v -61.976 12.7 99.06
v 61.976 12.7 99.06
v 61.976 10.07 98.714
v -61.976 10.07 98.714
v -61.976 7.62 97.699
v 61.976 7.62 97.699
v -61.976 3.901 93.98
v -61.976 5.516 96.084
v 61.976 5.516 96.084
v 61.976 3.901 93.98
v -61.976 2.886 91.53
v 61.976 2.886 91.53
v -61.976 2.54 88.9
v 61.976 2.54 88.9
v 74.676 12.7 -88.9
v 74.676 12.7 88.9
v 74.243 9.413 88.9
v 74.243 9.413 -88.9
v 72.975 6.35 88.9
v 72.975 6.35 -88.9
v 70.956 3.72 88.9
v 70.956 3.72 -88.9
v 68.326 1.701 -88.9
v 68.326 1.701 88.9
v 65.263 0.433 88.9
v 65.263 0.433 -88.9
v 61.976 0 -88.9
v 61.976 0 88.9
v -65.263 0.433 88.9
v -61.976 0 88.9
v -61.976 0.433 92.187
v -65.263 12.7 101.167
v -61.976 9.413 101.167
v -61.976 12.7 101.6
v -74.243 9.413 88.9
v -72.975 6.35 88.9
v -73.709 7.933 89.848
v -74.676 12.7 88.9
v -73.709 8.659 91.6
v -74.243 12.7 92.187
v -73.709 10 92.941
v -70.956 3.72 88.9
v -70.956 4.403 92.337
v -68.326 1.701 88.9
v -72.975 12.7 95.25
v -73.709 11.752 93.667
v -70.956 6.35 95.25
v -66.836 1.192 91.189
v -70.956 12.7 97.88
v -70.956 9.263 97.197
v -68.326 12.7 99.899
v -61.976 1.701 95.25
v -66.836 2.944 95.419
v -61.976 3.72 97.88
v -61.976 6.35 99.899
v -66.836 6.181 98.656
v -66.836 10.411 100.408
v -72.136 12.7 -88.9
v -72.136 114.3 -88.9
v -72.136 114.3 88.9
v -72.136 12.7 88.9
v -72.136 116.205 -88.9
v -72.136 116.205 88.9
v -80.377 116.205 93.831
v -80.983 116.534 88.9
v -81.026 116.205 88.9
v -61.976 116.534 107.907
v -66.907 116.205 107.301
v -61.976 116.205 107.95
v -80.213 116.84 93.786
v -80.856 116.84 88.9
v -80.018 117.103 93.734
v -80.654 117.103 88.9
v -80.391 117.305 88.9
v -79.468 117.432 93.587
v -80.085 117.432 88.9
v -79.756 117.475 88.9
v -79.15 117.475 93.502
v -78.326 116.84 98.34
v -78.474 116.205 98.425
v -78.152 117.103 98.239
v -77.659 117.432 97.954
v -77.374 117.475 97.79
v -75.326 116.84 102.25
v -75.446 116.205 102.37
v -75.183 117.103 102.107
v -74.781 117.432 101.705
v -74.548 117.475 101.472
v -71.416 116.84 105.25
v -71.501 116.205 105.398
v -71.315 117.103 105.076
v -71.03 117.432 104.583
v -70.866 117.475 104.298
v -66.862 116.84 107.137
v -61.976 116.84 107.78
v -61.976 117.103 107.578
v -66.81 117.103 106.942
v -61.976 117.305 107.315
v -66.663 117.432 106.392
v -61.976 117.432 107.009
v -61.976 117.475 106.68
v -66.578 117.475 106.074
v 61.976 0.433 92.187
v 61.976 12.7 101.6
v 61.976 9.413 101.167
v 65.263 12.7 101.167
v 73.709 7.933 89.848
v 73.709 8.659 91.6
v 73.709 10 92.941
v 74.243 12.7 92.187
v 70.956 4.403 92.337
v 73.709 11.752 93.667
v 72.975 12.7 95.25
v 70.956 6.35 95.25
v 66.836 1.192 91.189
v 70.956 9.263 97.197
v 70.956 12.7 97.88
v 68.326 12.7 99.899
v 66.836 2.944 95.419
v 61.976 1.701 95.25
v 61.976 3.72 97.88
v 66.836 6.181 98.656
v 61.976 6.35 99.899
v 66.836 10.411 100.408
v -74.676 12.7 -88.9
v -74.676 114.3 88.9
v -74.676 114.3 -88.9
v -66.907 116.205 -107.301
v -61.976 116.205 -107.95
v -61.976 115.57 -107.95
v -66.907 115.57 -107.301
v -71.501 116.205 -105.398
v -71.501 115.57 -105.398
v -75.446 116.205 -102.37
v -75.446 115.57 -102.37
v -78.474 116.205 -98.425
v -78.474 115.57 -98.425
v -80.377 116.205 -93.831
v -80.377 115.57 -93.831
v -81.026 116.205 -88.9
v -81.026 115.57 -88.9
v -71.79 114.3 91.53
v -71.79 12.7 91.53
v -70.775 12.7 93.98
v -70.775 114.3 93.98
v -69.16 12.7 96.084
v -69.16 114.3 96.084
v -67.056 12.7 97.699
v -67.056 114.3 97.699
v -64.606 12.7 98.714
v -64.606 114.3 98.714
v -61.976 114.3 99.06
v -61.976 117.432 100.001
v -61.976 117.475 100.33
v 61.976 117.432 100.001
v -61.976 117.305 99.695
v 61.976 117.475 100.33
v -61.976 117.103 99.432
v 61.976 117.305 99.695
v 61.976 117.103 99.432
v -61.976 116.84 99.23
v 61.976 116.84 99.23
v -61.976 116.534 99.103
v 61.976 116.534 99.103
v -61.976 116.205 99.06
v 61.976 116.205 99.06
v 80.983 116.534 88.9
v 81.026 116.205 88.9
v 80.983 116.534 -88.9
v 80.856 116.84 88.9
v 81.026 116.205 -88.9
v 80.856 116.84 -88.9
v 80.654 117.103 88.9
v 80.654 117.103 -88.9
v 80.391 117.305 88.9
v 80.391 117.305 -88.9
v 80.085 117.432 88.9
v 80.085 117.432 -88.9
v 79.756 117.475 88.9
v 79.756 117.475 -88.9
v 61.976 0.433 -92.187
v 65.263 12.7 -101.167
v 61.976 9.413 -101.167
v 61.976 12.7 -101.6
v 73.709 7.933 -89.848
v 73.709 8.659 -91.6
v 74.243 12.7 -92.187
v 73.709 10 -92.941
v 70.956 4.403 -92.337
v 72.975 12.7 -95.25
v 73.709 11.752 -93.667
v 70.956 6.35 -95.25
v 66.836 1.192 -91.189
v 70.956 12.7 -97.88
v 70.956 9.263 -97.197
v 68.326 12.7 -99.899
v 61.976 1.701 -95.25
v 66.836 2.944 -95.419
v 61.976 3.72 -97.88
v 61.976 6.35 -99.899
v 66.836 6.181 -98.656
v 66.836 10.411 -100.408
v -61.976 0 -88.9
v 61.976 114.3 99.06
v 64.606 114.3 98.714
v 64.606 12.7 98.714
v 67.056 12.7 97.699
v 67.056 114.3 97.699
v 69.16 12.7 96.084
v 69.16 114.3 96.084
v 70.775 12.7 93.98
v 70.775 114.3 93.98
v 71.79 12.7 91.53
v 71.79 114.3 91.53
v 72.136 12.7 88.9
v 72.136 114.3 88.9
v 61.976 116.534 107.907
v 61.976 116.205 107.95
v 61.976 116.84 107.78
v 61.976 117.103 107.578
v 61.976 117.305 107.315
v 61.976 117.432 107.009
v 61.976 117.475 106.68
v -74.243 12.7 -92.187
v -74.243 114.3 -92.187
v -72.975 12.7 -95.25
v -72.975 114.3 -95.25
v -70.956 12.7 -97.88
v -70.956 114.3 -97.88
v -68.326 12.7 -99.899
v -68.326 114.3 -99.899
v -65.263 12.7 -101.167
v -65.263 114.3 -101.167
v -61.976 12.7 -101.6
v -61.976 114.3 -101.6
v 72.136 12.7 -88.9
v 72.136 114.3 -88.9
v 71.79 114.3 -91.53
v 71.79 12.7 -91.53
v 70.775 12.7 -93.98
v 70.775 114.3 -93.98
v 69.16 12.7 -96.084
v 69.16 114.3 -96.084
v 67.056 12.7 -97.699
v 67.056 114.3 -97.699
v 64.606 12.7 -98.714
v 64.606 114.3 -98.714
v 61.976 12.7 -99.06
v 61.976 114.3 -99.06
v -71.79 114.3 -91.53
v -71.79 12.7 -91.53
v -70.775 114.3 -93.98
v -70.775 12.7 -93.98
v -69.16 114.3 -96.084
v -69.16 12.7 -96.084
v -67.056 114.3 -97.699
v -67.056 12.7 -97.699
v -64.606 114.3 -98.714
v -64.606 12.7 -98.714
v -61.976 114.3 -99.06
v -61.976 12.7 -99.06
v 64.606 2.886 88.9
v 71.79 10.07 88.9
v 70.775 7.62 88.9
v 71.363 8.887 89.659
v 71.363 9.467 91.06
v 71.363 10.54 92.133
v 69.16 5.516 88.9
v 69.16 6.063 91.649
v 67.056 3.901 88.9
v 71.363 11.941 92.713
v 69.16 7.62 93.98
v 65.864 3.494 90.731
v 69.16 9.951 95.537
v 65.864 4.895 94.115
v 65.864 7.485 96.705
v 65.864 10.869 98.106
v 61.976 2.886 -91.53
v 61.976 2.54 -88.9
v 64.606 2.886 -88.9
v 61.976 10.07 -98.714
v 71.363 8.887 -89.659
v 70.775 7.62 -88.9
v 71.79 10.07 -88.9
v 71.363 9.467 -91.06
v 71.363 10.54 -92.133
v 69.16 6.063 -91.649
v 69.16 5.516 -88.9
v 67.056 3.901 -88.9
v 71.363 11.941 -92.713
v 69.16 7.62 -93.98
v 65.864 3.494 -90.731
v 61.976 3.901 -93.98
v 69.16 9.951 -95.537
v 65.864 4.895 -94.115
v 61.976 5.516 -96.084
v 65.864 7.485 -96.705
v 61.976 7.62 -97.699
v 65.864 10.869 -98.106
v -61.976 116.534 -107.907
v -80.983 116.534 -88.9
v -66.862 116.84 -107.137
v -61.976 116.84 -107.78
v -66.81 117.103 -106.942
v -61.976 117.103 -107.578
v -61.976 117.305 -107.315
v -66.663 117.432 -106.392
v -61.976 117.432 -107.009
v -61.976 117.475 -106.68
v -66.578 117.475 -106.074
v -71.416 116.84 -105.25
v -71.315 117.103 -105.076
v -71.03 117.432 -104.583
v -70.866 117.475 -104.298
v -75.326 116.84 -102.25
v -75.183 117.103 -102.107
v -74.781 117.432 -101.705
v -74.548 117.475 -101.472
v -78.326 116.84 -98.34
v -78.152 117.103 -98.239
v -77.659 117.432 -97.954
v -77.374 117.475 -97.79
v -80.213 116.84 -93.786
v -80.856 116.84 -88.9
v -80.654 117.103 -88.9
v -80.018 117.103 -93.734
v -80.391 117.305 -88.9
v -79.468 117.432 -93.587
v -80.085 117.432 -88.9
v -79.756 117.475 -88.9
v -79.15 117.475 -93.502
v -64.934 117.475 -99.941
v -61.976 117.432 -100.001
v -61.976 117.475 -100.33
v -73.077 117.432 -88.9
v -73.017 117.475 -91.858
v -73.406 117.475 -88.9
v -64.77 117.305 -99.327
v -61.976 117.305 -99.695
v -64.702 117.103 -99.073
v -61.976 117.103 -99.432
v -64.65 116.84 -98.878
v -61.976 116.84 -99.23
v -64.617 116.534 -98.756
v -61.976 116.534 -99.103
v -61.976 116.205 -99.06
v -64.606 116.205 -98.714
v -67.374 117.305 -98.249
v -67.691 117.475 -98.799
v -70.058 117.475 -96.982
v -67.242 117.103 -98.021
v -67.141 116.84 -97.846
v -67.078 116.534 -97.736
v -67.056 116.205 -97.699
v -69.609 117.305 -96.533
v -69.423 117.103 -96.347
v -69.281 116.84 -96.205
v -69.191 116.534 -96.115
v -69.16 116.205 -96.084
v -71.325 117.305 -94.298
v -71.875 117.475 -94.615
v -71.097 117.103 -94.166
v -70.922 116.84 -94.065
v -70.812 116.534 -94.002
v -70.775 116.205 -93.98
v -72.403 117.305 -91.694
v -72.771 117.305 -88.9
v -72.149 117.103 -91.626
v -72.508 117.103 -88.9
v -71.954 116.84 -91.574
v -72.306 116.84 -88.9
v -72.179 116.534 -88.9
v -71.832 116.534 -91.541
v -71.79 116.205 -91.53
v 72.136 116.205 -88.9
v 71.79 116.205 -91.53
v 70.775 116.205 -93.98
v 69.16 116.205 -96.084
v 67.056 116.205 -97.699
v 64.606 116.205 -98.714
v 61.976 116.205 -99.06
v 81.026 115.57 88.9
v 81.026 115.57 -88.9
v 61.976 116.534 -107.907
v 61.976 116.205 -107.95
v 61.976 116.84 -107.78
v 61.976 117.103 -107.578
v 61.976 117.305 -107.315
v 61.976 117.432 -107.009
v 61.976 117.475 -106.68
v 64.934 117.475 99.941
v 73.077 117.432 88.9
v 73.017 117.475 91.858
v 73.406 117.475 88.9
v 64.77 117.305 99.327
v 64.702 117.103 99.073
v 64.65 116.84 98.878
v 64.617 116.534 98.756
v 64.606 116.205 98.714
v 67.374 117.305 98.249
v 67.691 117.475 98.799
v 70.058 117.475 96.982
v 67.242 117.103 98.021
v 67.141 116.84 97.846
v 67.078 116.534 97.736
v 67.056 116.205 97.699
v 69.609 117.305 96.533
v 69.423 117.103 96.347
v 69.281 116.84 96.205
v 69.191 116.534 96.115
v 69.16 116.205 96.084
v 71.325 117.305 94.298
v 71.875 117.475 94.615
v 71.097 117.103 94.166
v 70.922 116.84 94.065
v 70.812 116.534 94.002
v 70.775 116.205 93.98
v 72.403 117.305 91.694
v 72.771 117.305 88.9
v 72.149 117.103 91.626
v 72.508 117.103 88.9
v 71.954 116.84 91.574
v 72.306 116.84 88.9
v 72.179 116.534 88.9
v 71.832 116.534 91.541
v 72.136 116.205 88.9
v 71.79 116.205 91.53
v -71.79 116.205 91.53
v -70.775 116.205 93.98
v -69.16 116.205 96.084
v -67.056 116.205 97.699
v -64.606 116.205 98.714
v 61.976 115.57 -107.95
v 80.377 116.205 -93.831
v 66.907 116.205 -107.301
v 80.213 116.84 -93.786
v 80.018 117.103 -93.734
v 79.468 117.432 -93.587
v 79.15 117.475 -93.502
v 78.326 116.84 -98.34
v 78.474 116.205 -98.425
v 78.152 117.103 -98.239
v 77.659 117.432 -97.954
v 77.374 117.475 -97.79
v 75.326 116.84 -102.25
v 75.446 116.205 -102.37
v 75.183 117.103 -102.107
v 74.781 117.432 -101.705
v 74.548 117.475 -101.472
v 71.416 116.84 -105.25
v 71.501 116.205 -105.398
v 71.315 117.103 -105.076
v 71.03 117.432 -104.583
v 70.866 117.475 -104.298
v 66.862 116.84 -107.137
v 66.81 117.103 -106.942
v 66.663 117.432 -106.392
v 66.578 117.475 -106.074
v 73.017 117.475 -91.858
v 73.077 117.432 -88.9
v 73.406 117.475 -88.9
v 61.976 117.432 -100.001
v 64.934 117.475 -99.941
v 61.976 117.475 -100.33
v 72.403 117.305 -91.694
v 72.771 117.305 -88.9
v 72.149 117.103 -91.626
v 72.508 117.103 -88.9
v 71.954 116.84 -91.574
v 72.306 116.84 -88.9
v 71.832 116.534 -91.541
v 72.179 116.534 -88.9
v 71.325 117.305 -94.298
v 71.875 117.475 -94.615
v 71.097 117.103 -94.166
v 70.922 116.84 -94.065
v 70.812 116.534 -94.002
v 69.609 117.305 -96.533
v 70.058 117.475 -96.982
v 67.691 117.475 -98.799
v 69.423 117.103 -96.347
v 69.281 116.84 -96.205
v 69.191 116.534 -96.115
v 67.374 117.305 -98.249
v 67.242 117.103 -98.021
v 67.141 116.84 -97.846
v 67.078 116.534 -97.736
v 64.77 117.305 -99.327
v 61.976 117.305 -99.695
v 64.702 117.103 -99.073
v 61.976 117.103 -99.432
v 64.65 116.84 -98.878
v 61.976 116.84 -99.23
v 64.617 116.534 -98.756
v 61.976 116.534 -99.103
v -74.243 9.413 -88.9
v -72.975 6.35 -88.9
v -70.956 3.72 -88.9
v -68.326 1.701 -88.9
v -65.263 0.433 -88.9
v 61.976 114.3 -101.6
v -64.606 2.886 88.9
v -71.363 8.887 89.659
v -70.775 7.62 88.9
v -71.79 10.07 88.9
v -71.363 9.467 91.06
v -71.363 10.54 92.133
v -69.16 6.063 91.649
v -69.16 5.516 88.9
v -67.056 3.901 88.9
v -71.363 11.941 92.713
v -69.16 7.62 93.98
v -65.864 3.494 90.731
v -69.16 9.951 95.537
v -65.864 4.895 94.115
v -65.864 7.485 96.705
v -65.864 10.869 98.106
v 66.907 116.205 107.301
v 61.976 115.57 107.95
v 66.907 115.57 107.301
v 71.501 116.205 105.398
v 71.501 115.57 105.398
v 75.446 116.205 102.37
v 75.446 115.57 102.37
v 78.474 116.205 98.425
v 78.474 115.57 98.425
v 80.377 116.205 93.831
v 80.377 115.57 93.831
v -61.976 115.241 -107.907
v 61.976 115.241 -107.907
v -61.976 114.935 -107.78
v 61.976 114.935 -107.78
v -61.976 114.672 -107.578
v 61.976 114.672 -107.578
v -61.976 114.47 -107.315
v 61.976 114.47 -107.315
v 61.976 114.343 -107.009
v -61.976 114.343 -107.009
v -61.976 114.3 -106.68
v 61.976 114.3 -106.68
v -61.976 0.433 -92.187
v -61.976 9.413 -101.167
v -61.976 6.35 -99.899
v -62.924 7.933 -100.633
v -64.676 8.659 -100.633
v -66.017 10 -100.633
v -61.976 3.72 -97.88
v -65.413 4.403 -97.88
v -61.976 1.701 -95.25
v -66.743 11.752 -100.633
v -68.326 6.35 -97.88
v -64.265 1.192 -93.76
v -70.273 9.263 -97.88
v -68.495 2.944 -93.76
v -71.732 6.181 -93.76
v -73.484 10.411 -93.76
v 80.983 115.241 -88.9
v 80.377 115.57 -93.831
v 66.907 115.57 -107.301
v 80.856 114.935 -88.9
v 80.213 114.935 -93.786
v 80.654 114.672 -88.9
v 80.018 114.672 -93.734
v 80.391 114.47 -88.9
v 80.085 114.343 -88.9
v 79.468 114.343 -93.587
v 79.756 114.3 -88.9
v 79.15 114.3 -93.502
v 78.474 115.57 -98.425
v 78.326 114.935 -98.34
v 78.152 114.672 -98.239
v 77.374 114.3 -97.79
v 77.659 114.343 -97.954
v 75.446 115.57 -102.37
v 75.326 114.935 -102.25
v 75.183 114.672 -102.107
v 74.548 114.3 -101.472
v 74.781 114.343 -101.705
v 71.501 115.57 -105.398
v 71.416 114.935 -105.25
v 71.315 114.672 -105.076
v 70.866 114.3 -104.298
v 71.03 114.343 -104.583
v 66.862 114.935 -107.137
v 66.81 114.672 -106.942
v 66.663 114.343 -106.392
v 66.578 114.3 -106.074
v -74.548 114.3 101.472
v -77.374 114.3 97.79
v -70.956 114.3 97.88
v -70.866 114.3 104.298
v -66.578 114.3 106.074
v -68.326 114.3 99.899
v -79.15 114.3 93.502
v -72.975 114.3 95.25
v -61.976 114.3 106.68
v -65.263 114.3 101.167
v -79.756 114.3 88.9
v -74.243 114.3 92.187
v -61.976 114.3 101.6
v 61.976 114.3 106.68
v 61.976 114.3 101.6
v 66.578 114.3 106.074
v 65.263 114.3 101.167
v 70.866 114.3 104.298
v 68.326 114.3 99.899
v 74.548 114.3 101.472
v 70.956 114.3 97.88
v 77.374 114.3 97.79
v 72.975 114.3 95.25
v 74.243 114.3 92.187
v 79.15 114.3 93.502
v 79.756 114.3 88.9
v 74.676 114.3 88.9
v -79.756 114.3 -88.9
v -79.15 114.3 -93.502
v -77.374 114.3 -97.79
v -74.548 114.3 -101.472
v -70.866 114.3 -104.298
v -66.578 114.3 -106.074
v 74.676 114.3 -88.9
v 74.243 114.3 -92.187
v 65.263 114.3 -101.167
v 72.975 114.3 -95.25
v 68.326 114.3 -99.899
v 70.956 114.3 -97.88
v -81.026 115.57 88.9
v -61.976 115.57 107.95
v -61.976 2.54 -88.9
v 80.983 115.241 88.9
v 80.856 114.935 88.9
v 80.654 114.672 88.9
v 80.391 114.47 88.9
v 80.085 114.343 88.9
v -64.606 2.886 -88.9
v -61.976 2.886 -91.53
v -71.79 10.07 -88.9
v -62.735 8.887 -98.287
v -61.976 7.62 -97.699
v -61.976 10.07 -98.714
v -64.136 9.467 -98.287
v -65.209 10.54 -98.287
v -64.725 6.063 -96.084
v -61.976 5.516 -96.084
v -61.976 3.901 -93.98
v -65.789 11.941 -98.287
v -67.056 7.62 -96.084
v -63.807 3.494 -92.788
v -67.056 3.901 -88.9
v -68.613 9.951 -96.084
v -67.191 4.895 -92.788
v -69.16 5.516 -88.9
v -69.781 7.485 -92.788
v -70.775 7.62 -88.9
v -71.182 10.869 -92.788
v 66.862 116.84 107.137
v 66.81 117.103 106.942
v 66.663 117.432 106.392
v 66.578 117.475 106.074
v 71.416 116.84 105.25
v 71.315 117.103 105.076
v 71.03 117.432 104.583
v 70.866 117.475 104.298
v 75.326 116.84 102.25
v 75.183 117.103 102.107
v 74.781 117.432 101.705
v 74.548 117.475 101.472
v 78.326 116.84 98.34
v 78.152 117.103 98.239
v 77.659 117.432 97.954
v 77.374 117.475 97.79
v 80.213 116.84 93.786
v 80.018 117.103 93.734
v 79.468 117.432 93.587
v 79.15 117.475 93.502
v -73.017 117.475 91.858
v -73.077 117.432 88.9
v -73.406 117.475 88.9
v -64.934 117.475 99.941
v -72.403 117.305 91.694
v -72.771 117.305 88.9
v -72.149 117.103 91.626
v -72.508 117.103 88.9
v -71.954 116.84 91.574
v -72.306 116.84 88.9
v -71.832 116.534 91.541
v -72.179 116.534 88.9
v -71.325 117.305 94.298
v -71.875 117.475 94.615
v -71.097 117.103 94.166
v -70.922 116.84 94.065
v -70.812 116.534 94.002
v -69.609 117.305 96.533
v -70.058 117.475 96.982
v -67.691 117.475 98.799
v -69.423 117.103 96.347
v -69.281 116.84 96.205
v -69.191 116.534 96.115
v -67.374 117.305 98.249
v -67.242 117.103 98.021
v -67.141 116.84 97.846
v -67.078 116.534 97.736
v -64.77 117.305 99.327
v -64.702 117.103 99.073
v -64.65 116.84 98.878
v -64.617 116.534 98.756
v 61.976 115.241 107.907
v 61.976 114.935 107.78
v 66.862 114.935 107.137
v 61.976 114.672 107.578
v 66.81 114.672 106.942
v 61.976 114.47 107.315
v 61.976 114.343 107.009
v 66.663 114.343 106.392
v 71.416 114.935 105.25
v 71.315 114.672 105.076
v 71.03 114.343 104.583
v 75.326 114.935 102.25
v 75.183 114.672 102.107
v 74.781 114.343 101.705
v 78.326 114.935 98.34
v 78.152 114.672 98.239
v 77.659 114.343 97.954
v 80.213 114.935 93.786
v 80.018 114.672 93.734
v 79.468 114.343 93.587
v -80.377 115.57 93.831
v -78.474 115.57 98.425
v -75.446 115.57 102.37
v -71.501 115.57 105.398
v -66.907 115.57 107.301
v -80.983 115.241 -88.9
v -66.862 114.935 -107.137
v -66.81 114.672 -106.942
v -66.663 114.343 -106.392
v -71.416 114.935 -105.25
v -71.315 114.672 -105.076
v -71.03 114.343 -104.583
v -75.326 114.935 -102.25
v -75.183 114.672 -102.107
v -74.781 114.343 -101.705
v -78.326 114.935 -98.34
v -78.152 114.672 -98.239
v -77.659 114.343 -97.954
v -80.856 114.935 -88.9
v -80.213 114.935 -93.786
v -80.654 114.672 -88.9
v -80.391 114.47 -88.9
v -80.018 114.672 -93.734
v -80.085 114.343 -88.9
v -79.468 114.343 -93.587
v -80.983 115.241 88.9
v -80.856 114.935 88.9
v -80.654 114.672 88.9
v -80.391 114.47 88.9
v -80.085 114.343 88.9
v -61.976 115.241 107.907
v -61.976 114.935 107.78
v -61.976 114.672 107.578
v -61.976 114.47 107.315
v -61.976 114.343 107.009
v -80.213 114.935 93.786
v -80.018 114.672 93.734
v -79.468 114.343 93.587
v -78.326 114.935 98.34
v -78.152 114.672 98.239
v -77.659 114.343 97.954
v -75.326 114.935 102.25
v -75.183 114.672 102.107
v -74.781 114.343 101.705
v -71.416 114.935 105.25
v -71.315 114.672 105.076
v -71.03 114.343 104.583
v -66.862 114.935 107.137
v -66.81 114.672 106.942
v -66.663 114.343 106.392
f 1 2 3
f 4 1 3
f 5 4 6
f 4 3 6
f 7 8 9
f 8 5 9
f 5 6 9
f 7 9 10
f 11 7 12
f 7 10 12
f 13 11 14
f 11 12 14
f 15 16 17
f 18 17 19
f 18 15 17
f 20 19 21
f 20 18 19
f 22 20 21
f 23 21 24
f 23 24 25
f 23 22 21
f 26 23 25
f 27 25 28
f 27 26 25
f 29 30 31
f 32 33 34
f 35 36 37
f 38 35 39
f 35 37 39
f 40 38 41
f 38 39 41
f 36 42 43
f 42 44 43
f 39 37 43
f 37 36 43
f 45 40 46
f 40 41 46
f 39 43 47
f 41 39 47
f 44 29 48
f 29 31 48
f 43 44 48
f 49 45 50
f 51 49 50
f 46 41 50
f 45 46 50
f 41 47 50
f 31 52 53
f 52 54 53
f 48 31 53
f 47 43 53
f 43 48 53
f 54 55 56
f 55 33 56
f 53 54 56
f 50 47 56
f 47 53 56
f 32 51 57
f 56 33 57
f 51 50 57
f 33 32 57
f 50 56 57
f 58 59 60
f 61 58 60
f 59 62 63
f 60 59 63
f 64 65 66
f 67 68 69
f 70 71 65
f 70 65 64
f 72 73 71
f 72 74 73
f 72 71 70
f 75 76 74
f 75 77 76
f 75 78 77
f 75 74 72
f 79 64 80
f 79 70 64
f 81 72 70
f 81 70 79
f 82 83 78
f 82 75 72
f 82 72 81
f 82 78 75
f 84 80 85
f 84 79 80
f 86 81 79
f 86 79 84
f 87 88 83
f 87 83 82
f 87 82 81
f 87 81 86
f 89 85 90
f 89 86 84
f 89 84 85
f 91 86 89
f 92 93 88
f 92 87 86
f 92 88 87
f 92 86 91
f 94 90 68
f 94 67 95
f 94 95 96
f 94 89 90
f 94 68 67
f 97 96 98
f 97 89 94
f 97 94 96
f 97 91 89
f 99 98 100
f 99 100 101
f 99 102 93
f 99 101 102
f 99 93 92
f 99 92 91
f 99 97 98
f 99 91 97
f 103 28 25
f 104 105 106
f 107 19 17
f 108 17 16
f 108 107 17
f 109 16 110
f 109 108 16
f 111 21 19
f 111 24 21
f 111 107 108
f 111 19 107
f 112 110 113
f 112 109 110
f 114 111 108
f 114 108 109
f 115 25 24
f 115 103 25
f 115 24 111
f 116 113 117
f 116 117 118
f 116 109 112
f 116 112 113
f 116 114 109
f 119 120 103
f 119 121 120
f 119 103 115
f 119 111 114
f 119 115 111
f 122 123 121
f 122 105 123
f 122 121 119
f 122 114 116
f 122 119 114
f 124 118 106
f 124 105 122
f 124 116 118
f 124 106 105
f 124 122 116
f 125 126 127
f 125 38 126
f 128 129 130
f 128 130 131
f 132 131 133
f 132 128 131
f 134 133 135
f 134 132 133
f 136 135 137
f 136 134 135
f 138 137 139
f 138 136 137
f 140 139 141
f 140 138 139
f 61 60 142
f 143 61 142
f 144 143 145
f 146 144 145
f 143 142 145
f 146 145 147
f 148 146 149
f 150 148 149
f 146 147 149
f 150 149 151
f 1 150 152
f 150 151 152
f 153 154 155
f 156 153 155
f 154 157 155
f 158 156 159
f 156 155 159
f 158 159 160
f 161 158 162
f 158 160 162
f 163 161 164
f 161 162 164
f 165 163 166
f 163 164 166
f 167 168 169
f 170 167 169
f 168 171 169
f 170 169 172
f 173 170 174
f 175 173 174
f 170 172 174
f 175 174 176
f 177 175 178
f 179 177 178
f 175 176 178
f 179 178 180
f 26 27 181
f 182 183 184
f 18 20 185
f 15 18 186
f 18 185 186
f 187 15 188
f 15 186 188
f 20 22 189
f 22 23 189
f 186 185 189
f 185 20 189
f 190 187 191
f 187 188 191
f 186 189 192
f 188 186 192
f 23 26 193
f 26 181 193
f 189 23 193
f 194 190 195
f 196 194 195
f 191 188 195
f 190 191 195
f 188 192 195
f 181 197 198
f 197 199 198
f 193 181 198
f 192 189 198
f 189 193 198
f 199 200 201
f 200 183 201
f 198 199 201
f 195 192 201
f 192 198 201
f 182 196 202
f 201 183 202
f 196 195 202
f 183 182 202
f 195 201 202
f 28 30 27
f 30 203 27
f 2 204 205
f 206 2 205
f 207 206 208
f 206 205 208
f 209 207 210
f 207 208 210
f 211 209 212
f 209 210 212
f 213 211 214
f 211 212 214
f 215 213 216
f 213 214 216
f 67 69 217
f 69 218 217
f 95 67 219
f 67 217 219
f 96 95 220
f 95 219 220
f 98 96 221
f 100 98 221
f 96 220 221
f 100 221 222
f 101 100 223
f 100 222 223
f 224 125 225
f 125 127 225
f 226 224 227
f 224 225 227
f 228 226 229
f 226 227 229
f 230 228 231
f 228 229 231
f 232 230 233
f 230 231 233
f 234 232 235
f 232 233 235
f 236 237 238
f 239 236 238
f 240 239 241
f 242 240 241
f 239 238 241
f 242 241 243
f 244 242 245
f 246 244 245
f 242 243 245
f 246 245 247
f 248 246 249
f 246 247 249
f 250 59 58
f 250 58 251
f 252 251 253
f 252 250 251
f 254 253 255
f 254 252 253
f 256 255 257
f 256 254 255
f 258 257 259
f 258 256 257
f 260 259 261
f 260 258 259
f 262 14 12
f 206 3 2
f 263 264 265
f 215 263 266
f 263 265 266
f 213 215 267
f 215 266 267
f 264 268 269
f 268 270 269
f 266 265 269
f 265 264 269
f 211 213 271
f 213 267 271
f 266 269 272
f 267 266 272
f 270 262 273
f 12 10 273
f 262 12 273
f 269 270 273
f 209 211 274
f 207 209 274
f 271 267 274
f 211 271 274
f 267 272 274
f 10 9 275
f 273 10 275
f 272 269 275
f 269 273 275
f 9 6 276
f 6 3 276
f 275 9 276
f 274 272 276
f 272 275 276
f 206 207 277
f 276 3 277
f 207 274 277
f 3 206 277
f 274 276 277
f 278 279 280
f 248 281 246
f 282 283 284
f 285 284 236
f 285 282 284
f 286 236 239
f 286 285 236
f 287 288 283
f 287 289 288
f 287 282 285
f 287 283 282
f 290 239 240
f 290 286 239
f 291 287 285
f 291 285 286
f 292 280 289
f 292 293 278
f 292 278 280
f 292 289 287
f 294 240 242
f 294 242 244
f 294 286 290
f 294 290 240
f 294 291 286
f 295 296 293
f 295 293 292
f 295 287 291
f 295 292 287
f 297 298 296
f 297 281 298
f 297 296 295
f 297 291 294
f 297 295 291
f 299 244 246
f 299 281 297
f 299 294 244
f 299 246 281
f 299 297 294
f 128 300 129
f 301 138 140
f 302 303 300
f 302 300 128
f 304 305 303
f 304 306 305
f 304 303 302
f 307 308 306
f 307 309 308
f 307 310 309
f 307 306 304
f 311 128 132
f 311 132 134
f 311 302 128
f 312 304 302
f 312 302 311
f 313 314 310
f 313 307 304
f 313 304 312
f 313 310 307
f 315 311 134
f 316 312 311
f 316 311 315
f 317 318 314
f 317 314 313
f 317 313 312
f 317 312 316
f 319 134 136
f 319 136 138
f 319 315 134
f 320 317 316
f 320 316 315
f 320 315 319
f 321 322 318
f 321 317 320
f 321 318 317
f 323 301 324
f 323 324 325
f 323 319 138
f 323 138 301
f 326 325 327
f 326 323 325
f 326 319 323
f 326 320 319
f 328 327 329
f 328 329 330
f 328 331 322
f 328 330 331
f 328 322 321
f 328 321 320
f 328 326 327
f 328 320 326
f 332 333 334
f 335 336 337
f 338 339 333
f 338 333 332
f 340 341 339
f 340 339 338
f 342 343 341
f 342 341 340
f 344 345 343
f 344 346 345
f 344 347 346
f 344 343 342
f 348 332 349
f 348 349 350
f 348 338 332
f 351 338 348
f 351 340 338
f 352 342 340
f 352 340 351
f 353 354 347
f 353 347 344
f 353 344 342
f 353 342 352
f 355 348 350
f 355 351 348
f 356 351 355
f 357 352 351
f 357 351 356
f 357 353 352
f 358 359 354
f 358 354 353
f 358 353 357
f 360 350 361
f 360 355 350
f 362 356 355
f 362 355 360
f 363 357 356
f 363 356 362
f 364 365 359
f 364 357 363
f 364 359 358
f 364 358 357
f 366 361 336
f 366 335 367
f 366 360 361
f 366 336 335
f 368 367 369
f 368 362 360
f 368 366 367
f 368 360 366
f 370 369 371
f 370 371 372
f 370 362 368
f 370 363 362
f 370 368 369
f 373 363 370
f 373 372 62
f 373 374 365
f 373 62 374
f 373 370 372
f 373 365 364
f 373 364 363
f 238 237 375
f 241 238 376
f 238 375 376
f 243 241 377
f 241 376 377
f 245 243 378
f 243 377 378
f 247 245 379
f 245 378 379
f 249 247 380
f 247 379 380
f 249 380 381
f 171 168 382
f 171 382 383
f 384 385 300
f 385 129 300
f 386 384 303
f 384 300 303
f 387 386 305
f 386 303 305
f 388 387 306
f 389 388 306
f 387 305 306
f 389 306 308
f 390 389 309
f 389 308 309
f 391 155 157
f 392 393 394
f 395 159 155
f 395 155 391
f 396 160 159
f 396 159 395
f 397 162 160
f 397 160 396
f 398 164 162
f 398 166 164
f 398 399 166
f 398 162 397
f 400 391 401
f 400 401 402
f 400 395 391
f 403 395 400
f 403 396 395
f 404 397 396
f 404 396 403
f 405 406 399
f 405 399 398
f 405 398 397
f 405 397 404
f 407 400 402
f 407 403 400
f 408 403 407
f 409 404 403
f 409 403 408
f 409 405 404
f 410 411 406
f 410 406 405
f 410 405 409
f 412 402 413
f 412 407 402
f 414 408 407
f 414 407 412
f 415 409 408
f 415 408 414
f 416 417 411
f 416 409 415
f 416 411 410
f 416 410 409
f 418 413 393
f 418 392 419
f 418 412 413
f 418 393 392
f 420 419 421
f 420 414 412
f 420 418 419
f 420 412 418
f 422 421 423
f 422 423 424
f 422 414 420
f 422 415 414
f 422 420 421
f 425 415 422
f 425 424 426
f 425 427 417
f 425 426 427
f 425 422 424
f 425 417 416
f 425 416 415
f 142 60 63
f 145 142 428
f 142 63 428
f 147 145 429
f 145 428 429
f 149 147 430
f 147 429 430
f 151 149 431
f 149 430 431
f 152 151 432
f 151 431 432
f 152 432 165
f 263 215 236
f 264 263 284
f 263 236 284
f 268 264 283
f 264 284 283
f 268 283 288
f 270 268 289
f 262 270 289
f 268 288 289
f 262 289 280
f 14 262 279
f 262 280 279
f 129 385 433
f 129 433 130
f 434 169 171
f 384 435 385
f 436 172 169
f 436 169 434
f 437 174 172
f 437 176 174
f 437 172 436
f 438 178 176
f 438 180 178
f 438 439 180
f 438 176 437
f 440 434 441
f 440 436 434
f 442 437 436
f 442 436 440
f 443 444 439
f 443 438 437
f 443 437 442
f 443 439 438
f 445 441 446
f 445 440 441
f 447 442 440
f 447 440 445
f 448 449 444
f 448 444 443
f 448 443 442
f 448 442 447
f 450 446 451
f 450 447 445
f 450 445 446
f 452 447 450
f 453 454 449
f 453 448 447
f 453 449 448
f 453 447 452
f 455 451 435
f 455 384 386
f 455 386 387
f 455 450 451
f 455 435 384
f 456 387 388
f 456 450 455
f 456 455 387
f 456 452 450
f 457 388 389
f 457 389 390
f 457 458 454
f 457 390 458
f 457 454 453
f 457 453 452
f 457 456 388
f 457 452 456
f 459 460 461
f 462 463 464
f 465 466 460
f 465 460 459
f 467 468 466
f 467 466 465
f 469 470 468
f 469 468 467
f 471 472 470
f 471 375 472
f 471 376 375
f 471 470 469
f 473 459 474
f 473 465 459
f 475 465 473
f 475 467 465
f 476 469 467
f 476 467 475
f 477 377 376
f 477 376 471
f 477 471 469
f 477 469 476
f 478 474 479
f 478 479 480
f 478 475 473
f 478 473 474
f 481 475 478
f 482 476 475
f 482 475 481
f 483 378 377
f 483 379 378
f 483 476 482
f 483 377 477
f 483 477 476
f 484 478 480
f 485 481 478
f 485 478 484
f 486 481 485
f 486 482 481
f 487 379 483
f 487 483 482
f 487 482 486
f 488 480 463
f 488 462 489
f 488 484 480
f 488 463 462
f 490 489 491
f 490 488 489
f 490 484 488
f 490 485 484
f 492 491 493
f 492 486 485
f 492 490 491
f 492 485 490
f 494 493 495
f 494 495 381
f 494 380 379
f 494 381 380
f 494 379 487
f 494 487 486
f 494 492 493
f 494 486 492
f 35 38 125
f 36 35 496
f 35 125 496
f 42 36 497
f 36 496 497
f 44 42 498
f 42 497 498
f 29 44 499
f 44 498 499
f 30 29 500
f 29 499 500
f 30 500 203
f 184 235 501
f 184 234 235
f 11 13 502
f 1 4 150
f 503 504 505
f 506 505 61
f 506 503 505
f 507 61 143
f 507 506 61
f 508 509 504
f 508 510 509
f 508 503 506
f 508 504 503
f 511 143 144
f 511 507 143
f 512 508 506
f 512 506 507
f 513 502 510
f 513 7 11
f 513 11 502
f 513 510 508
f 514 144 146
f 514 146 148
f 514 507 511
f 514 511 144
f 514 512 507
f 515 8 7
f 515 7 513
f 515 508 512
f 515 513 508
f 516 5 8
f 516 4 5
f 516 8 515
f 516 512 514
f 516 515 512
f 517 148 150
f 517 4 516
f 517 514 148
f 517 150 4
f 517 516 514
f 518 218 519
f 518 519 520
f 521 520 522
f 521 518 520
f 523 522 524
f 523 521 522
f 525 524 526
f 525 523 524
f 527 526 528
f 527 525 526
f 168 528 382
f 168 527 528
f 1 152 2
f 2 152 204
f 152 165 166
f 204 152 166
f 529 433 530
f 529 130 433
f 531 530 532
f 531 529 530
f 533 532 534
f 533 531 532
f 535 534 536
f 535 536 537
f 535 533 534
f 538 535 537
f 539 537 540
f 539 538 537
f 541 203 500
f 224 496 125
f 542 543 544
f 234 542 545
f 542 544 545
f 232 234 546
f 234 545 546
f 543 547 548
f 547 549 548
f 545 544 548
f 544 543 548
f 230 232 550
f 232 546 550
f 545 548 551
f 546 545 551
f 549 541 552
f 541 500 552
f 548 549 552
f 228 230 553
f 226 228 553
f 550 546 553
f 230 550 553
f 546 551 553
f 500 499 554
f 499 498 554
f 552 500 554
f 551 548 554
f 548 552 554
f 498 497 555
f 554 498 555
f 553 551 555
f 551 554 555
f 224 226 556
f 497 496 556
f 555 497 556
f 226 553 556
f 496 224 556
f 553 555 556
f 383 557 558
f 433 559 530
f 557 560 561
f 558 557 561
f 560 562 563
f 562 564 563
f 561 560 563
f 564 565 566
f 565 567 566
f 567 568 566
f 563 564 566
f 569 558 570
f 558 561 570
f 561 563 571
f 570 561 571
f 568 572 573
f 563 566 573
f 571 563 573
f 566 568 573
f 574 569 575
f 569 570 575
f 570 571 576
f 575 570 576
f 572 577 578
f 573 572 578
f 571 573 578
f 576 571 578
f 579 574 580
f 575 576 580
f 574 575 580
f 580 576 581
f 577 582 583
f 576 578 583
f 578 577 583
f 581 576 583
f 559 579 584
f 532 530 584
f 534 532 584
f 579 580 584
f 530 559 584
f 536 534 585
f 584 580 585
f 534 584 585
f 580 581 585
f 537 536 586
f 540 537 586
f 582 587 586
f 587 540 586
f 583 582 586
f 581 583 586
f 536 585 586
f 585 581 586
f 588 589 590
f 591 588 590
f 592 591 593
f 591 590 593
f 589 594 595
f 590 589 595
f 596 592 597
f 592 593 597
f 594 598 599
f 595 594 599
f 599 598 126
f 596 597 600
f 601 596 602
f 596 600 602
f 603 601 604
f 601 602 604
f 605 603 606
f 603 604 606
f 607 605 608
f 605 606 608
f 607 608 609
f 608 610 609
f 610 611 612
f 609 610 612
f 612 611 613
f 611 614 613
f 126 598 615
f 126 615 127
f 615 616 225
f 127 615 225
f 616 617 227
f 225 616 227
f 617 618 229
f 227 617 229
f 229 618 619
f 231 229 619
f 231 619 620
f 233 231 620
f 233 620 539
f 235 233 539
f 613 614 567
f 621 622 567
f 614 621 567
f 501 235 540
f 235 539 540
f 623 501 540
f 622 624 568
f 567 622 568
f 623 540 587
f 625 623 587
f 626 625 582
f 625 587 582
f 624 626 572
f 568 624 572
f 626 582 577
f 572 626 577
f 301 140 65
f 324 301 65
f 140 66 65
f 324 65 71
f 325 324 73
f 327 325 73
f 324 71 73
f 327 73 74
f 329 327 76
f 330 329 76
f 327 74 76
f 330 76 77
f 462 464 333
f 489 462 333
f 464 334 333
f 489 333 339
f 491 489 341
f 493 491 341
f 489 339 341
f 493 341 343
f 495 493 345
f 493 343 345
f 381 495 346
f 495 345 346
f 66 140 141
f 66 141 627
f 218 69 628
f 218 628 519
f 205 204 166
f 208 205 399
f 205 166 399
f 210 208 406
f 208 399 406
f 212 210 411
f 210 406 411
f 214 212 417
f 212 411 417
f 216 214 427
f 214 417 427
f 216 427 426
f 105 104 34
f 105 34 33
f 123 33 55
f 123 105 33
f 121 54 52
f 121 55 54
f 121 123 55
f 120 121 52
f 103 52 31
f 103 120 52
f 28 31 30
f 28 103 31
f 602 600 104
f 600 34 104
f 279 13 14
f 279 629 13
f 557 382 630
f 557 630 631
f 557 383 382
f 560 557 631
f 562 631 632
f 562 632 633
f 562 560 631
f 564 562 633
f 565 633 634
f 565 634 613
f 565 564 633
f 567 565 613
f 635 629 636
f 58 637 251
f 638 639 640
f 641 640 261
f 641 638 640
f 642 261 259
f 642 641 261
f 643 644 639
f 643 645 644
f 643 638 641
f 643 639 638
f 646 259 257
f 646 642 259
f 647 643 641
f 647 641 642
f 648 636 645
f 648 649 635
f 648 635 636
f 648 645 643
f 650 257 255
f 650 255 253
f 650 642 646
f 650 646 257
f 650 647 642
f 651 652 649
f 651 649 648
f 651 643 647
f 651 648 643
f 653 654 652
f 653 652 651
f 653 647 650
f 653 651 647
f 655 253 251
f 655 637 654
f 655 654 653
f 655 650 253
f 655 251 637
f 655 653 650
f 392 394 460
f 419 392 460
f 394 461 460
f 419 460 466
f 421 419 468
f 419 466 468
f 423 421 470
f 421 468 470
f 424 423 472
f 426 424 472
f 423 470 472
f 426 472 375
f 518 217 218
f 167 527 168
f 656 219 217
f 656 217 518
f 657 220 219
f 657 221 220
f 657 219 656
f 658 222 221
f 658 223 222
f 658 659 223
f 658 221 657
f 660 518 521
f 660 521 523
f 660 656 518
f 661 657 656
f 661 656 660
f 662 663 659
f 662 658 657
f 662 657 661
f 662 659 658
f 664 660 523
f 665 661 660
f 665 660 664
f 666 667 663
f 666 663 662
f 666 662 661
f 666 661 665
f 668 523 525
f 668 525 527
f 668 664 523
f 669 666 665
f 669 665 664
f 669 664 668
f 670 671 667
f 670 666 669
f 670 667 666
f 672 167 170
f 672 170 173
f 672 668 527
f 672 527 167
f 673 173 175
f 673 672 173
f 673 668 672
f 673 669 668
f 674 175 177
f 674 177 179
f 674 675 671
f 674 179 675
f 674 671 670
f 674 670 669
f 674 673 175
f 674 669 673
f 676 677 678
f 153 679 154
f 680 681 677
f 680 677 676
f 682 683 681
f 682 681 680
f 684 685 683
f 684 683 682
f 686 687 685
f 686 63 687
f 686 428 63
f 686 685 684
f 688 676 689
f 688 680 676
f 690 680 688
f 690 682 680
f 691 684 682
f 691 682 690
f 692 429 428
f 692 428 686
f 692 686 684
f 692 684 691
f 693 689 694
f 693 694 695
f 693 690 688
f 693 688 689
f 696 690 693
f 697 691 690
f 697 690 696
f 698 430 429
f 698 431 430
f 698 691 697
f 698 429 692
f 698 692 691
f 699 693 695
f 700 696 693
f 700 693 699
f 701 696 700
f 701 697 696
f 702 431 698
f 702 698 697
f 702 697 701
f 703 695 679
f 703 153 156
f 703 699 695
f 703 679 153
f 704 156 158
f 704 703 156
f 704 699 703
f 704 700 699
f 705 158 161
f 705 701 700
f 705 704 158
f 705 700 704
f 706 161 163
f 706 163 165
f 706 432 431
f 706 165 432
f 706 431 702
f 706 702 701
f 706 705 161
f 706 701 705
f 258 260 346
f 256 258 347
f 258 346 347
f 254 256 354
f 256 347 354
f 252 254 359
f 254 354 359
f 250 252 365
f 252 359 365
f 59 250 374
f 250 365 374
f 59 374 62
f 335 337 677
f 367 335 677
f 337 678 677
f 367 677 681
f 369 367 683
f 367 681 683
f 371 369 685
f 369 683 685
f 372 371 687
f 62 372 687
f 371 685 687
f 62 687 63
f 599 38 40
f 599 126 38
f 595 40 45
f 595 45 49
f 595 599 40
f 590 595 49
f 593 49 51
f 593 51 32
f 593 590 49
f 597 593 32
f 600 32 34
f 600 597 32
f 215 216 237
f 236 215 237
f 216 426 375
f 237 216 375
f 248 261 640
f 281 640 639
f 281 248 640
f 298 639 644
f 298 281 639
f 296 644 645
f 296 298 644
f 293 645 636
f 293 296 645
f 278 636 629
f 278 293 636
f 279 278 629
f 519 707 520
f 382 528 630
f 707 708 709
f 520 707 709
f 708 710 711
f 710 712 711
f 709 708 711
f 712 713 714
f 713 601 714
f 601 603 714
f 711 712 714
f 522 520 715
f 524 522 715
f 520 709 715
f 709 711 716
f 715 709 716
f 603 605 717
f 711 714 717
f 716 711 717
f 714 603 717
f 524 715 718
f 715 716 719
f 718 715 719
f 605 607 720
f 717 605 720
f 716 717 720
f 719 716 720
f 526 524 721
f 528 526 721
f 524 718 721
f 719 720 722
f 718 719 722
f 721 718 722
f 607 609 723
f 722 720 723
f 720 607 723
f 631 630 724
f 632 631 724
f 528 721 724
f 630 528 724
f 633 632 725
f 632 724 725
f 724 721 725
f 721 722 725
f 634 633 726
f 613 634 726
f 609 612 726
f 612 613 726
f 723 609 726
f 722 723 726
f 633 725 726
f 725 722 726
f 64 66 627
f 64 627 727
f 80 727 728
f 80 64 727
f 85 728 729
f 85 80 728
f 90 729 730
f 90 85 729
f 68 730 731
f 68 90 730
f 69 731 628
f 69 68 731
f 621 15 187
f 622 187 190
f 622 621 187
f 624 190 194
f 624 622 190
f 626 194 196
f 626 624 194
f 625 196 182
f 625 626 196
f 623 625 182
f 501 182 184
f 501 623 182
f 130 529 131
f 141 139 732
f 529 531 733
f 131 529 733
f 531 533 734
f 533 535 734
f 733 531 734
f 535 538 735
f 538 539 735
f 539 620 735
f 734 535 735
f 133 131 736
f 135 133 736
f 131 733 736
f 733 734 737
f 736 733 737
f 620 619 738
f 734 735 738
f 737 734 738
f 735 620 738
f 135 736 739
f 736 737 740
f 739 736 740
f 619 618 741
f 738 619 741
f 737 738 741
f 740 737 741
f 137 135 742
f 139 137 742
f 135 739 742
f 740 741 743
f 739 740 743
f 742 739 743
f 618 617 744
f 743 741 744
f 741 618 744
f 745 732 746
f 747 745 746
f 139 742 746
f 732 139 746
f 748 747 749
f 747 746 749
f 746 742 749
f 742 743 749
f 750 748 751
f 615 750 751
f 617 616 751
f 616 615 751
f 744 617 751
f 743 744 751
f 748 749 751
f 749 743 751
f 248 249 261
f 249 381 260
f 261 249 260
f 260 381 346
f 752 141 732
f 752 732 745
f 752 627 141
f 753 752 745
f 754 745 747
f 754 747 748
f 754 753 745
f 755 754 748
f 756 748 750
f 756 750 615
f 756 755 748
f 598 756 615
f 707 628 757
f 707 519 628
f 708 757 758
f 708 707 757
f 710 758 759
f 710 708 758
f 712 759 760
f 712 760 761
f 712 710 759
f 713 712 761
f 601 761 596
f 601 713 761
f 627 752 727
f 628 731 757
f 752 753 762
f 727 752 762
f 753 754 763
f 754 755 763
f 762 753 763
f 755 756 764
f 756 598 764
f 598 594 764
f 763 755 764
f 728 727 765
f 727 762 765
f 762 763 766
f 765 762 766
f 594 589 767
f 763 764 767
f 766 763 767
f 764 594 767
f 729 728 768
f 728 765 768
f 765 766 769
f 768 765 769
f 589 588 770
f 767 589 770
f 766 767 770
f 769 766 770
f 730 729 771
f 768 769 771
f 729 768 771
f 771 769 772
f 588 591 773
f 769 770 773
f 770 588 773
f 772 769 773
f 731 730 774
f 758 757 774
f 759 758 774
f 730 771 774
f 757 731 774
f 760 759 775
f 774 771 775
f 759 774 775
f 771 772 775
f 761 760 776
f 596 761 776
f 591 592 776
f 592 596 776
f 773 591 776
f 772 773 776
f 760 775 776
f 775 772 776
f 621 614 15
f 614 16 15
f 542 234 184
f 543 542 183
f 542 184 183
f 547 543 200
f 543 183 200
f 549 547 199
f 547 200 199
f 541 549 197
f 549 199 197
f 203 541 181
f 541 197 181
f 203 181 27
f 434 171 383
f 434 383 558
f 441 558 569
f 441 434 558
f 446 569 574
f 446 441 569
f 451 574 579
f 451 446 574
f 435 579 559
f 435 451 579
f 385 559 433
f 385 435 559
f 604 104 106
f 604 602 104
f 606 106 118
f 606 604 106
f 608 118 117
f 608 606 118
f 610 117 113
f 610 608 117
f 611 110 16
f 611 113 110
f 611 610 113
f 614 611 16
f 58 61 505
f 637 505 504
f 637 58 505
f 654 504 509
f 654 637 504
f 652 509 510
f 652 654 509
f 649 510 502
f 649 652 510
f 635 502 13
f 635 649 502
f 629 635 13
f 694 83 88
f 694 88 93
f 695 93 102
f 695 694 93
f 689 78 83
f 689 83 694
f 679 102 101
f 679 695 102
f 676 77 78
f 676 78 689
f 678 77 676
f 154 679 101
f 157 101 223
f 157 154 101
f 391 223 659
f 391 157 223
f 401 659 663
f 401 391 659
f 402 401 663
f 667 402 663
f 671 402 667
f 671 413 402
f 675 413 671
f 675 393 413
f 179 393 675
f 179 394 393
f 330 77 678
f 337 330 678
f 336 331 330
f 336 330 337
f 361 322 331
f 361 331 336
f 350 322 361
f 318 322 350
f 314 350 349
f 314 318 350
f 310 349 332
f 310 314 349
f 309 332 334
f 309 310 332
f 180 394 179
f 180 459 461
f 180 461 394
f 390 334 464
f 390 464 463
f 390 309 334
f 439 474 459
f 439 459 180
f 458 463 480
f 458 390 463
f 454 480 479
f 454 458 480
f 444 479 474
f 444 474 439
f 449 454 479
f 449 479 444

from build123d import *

# Parameters (mm, degrees)
SKETCH1_W           = 149.352
SKETCH1_H           = 203.2
BOSS_EXTRUDE1_DEPTH = 114.3
FILLET1_R           = 12.7
SHELL1_T            = -2.54
BOSS_EXTRUDE2_START = 3.175
BOSS_EXTRUDE2_DEPTH = 3.175
FILLET2_R           = 1.27


with BuildPart() as part:
    # Sketch1 → Boss-Extrude1 (new body)
    with BuildSketch(Plane(origin=(0, 0, 0), x_dir=(1, 0, 0), z_dir=(0, 1, 0))):
        Rectangle(SKETCH1_W, SKETCH1_H)
    extrude(amount=BOSS_EXTRUDE1_DEPTH)

    # Fillet1
    fillet1_edges = [part.edges().sort_by_distance(p)[0] for p in [
        (0, 0, 101.6),
        (-74.676, 0, 0),
        (0, 0, -101.6),
        (74.676, 0, 0),
        (74.676, 57.15, 101.6),
        (-74.676, 57.15, 101.6),
        (-74.676, 57.15, -101.6),
        (74.676, 57.15, -101.6),
    ]]
    fillet(fillet1_edges, radius=FILLET1_R)

    # Shell1
    shell1_openings = [part.faces().sort_by_distance(p)[0] for p in [
        (0, 114.3, 0),
    ]]
    offset(amount=SHELL1_T, openings=shell1_openings, kind=Kind.INTERSECTION)

    # Sketch2 → Boss-Extrude2 (add)
    with BuildSketch(Plane(origin=(0, 114.3, 0), x_dir=(1, 0, 0), z_dir=(0, 1, 0)).offset(BOSS_EXTRUDE2_START)):
        with BuildLine():
            Line((61.976, 107.95), (-61.976, 107.95))
            ThreePointArc((-61.976, 107.95), (-75.446384182, 102.370384182), (-81.026, 88.9))
            Line((-81.026, 88.9), (-81.026, -88.9))
            ThreePointArc((-81.026, -88.9), (-75.446384182, -102.370384182), (-61.976, -107.95))
            Line((-61.976, -107.95), (61.976, -107.95))
            ThreePointArc((61.976, -107.95), (75.446384182, -102.370384182), (81.026, -88.9))
            Line((81.026, -88.9), (81.026, 88.9))
            ThreePointArc((81.026, 88.9), (75.446384182, 102.370384182), (61.976, 107.95))
        make_face()
        with BuildLine():
            Line((-72.136, 88.9), (-72.136, -88.9))
            ThreePointArc((-72.136, -88.9), (-69.160204897, -96.084204897), (-61.976, -99.06))
            Line((-61.976, -99.06), (61.976, -99.06))
            ThreePointArc((61.976, -99.06), (69.160204897, -96.084204897), (72.136, -88.9))
            Line((72.136, -88.9), (72.136, 88.9))
            ThreePointArc((72.136, 88.9), (69.160204897, 96.084204897), (61.976, 99.06))
            Line((61.976, 99.06), (-61.976, 99.06))
            ThreePointArc((-61.976, 99.06), (-69.160204897, 96.084204897), (-72.136, 88.9))
        make_face(mode=Mode.SUBTRACT)
    extrude(amount=-BOSS_EXTRUDE2_DEPTH)

    # Fillet2
    fillet2_edges = [part.edges().sort_by_distance(p)[0] for p in [
        (75.446384182, 117.475, -102.370384182),
        (0, 117.475, -107.95),
        (-75.446384182, 117.475, -102.370384182),
        (-81.026, 117.475, 0),
        (-75.446384182, 117.475, 102.370384182),
        (0, 117.475, 107.95),
        (75.446384182, 117.475, 102.370384182),
        (81.026, 117.475, 0),
        (75.446384182, 114.3, -102.370384182),
        (0, 114.3, -107.95),
        (-75.446384182, 114.3, -102.370384182),
        (-81.026, 114.3, 0),
        (-75.446384182, 114.3, 102.370384182),
        (0, 114.3, 107.95),
        (75.446384182, 114.3, 102.370384182),
        (81.026, 114.3, 0),
        (-69.160204897, 117.475, -96.084204897),
        (-72.136, 117.475, 0),
        (-69.160204897, 117.475, 96.084204897),
        (0, 117.475, 99.06),
        (69.160204897, 117.475, 96.084204897),
        (72.136, 117.475, 0),
        (69.160204897, 117.475, -96.084204897),
        (0, 117.475, -99.06),
    ]]
    fillet(fillet2_edges, radius=FILLET2_R)


solid = part.part
